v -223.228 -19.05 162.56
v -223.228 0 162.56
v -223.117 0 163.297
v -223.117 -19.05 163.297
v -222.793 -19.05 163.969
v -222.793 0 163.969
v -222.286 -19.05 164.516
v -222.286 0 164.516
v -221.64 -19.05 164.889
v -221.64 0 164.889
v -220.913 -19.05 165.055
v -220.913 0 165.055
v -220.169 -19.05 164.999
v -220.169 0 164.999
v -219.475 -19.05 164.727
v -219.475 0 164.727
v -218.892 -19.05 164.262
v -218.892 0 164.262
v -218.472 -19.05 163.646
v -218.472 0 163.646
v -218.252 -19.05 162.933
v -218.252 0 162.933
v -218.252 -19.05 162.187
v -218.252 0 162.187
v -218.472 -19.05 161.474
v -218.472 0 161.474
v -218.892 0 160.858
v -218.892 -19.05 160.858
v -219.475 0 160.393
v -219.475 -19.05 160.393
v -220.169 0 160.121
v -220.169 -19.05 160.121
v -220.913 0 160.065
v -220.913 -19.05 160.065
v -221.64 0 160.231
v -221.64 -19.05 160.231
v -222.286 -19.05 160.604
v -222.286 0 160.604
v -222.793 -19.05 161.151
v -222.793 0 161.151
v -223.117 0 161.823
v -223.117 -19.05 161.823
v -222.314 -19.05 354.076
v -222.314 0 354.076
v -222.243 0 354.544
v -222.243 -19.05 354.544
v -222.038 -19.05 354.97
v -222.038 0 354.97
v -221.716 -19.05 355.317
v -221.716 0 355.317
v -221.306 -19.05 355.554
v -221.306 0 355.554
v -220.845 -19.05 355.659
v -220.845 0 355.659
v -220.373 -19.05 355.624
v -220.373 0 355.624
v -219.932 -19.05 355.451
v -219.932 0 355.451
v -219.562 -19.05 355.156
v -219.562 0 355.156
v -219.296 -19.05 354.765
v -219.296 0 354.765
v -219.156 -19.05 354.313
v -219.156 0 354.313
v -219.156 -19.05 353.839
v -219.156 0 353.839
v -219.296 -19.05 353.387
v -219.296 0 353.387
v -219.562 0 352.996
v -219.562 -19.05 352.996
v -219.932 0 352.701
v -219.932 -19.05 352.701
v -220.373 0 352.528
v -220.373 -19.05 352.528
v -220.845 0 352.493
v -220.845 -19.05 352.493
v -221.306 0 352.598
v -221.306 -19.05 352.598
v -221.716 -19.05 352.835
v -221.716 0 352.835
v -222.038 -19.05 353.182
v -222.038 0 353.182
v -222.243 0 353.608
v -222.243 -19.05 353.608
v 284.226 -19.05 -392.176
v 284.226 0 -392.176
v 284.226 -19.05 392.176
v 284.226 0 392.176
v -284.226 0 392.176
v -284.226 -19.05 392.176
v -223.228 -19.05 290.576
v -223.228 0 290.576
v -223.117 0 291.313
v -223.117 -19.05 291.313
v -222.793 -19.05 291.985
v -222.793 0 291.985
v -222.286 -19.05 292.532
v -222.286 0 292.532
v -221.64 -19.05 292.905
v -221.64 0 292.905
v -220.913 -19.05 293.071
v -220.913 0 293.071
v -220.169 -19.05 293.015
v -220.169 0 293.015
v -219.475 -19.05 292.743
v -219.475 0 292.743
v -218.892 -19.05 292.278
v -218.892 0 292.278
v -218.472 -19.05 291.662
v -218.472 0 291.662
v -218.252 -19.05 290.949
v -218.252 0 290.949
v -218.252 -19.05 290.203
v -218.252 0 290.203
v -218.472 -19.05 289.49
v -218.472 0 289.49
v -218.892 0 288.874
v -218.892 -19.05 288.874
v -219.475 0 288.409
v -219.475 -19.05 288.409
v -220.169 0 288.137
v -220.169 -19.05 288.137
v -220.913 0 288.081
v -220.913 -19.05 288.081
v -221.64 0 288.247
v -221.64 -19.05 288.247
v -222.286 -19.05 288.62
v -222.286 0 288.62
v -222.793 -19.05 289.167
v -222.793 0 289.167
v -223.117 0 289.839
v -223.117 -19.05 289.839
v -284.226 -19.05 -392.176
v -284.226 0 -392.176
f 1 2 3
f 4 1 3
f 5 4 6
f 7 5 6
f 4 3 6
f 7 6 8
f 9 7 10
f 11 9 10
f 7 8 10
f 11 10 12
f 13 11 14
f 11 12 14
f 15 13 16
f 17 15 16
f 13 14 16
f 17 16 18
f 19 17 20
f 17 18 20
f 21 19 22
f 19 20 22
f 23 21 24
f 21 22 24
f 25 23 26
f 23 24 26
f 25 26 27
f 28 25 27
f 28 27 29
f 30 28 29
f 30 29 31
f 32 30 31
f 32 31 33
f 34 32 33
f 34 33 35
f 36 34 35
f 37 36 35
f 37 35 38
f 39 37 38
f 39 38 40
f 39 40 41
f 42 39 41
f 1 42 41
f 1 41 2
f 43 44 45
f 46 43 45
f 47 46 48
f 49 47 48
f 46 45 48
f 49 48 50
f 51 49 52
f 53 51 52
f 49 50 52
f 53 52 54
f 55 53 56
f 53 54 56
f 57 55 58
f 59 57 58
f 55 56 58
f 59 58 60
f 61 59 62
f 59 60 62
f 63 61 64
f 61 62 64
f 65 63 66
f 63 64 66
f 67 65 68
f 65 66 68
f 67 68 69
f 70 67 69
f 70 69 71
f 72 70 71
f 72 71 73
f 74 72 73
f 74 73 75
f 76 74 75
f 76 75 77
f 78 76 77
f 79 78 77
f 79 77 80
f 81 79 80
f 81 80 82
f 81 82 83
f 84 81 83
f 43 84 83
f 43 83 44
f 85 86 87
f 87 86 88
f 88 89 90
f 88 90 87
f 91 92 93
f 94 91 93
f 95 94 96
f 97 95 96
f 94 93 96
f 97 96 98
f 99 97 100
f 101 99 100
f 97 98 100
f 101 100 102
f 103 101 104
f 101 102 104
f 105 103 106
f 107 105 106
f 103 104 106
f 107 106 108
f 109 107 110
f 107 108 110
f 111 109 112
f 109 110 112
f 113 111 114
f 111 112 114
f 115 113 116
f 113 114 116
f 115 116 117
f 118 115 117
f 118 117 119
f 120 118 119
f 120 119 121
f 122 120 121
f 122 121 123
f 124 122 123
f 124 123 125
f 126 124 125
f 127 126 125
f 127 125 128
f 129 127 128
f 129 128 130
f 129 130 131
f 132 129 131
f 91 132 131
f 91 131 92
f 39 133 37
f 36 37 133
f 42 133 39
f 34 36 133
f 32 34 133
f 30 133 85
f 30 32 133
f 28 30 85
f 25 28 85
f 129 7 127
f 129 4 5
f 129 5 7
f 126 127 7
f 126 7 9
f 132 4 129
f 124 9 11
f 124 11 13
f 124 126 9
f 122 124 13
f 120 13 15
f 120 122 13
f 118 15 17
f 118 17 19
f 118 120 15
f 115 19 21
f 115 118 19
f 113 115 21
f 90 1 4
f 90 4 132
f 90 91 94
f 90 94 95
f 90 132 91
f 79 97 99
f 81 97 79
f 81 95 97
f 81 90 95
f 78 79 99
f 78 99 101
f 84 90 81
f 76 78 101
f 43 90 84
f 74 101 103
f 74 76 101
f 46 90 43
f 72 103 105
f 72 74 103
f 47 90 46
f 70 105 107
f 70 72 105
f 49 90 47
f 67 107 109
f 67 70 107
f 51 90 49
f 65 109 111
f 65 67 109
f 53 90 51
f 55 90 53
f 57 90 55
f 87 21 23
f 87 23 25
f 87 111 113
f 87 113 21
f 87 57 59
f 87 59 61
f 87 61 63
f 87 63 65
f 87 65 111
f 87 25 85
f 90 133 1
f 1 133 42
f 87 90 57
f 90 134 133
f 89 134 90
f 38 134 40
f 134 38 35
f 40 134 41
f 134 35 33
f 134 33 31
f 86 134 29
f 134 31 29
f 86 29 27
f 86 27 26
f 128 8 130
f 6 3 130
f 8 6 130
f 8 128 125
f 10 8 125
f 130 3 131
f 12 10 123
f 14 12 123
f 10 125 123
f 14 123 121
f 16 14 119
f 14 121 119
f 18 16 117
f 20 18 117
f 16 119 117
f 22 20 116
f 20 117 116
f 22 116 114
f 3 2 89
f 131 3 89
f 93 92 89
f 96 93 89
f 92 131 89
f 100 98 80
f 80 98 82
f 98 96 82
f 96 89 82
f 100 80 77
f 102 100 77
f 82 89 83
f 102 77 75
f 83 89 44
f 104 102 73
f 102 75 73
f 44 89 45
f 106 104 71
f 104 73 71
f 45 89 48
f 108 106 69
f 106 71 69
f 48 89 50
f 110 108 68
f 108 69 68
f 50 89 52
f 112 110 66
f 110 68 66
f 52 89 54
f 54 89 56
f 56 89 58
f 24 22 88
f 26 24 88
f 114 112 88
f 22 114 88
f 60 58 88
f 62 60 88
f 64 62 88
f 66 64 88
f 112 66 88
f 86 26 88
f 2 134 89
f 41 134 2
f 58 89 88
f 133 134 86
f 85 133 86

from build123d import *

# Parameters (mm, degrees)
F0_W     = 568.452
F0_H     = 784.352
F1_DEPTH = 19.05
F3_D     = 5.0038
F3_DEPTH = 25.4
F5_D     = 3.175
F5_DEPTH = 25.4


with BuildPart() as f1:
    # F0 (on Front) → F1 (new body)
    with BuildSketch(Plane.XZ):
        Rectangle(F0_W, F0_H)
    extrude(amount=F1_DEPTH)

    # F3
    with Locations(Plane.XZ.offset(19.05)):
        with Locations((-220.726, 290.576), (-220.726, 162.56)):
            Hole(F3_D / 2, depth=F3_DEPTH)

    # F5
    with Locations(Plane.XZ.offset(19.05)):
        with Locations((-220.726, 354.076)):
            Hole(F5_D / 2, depth=F5_DEPTH)


solid = f1.part
